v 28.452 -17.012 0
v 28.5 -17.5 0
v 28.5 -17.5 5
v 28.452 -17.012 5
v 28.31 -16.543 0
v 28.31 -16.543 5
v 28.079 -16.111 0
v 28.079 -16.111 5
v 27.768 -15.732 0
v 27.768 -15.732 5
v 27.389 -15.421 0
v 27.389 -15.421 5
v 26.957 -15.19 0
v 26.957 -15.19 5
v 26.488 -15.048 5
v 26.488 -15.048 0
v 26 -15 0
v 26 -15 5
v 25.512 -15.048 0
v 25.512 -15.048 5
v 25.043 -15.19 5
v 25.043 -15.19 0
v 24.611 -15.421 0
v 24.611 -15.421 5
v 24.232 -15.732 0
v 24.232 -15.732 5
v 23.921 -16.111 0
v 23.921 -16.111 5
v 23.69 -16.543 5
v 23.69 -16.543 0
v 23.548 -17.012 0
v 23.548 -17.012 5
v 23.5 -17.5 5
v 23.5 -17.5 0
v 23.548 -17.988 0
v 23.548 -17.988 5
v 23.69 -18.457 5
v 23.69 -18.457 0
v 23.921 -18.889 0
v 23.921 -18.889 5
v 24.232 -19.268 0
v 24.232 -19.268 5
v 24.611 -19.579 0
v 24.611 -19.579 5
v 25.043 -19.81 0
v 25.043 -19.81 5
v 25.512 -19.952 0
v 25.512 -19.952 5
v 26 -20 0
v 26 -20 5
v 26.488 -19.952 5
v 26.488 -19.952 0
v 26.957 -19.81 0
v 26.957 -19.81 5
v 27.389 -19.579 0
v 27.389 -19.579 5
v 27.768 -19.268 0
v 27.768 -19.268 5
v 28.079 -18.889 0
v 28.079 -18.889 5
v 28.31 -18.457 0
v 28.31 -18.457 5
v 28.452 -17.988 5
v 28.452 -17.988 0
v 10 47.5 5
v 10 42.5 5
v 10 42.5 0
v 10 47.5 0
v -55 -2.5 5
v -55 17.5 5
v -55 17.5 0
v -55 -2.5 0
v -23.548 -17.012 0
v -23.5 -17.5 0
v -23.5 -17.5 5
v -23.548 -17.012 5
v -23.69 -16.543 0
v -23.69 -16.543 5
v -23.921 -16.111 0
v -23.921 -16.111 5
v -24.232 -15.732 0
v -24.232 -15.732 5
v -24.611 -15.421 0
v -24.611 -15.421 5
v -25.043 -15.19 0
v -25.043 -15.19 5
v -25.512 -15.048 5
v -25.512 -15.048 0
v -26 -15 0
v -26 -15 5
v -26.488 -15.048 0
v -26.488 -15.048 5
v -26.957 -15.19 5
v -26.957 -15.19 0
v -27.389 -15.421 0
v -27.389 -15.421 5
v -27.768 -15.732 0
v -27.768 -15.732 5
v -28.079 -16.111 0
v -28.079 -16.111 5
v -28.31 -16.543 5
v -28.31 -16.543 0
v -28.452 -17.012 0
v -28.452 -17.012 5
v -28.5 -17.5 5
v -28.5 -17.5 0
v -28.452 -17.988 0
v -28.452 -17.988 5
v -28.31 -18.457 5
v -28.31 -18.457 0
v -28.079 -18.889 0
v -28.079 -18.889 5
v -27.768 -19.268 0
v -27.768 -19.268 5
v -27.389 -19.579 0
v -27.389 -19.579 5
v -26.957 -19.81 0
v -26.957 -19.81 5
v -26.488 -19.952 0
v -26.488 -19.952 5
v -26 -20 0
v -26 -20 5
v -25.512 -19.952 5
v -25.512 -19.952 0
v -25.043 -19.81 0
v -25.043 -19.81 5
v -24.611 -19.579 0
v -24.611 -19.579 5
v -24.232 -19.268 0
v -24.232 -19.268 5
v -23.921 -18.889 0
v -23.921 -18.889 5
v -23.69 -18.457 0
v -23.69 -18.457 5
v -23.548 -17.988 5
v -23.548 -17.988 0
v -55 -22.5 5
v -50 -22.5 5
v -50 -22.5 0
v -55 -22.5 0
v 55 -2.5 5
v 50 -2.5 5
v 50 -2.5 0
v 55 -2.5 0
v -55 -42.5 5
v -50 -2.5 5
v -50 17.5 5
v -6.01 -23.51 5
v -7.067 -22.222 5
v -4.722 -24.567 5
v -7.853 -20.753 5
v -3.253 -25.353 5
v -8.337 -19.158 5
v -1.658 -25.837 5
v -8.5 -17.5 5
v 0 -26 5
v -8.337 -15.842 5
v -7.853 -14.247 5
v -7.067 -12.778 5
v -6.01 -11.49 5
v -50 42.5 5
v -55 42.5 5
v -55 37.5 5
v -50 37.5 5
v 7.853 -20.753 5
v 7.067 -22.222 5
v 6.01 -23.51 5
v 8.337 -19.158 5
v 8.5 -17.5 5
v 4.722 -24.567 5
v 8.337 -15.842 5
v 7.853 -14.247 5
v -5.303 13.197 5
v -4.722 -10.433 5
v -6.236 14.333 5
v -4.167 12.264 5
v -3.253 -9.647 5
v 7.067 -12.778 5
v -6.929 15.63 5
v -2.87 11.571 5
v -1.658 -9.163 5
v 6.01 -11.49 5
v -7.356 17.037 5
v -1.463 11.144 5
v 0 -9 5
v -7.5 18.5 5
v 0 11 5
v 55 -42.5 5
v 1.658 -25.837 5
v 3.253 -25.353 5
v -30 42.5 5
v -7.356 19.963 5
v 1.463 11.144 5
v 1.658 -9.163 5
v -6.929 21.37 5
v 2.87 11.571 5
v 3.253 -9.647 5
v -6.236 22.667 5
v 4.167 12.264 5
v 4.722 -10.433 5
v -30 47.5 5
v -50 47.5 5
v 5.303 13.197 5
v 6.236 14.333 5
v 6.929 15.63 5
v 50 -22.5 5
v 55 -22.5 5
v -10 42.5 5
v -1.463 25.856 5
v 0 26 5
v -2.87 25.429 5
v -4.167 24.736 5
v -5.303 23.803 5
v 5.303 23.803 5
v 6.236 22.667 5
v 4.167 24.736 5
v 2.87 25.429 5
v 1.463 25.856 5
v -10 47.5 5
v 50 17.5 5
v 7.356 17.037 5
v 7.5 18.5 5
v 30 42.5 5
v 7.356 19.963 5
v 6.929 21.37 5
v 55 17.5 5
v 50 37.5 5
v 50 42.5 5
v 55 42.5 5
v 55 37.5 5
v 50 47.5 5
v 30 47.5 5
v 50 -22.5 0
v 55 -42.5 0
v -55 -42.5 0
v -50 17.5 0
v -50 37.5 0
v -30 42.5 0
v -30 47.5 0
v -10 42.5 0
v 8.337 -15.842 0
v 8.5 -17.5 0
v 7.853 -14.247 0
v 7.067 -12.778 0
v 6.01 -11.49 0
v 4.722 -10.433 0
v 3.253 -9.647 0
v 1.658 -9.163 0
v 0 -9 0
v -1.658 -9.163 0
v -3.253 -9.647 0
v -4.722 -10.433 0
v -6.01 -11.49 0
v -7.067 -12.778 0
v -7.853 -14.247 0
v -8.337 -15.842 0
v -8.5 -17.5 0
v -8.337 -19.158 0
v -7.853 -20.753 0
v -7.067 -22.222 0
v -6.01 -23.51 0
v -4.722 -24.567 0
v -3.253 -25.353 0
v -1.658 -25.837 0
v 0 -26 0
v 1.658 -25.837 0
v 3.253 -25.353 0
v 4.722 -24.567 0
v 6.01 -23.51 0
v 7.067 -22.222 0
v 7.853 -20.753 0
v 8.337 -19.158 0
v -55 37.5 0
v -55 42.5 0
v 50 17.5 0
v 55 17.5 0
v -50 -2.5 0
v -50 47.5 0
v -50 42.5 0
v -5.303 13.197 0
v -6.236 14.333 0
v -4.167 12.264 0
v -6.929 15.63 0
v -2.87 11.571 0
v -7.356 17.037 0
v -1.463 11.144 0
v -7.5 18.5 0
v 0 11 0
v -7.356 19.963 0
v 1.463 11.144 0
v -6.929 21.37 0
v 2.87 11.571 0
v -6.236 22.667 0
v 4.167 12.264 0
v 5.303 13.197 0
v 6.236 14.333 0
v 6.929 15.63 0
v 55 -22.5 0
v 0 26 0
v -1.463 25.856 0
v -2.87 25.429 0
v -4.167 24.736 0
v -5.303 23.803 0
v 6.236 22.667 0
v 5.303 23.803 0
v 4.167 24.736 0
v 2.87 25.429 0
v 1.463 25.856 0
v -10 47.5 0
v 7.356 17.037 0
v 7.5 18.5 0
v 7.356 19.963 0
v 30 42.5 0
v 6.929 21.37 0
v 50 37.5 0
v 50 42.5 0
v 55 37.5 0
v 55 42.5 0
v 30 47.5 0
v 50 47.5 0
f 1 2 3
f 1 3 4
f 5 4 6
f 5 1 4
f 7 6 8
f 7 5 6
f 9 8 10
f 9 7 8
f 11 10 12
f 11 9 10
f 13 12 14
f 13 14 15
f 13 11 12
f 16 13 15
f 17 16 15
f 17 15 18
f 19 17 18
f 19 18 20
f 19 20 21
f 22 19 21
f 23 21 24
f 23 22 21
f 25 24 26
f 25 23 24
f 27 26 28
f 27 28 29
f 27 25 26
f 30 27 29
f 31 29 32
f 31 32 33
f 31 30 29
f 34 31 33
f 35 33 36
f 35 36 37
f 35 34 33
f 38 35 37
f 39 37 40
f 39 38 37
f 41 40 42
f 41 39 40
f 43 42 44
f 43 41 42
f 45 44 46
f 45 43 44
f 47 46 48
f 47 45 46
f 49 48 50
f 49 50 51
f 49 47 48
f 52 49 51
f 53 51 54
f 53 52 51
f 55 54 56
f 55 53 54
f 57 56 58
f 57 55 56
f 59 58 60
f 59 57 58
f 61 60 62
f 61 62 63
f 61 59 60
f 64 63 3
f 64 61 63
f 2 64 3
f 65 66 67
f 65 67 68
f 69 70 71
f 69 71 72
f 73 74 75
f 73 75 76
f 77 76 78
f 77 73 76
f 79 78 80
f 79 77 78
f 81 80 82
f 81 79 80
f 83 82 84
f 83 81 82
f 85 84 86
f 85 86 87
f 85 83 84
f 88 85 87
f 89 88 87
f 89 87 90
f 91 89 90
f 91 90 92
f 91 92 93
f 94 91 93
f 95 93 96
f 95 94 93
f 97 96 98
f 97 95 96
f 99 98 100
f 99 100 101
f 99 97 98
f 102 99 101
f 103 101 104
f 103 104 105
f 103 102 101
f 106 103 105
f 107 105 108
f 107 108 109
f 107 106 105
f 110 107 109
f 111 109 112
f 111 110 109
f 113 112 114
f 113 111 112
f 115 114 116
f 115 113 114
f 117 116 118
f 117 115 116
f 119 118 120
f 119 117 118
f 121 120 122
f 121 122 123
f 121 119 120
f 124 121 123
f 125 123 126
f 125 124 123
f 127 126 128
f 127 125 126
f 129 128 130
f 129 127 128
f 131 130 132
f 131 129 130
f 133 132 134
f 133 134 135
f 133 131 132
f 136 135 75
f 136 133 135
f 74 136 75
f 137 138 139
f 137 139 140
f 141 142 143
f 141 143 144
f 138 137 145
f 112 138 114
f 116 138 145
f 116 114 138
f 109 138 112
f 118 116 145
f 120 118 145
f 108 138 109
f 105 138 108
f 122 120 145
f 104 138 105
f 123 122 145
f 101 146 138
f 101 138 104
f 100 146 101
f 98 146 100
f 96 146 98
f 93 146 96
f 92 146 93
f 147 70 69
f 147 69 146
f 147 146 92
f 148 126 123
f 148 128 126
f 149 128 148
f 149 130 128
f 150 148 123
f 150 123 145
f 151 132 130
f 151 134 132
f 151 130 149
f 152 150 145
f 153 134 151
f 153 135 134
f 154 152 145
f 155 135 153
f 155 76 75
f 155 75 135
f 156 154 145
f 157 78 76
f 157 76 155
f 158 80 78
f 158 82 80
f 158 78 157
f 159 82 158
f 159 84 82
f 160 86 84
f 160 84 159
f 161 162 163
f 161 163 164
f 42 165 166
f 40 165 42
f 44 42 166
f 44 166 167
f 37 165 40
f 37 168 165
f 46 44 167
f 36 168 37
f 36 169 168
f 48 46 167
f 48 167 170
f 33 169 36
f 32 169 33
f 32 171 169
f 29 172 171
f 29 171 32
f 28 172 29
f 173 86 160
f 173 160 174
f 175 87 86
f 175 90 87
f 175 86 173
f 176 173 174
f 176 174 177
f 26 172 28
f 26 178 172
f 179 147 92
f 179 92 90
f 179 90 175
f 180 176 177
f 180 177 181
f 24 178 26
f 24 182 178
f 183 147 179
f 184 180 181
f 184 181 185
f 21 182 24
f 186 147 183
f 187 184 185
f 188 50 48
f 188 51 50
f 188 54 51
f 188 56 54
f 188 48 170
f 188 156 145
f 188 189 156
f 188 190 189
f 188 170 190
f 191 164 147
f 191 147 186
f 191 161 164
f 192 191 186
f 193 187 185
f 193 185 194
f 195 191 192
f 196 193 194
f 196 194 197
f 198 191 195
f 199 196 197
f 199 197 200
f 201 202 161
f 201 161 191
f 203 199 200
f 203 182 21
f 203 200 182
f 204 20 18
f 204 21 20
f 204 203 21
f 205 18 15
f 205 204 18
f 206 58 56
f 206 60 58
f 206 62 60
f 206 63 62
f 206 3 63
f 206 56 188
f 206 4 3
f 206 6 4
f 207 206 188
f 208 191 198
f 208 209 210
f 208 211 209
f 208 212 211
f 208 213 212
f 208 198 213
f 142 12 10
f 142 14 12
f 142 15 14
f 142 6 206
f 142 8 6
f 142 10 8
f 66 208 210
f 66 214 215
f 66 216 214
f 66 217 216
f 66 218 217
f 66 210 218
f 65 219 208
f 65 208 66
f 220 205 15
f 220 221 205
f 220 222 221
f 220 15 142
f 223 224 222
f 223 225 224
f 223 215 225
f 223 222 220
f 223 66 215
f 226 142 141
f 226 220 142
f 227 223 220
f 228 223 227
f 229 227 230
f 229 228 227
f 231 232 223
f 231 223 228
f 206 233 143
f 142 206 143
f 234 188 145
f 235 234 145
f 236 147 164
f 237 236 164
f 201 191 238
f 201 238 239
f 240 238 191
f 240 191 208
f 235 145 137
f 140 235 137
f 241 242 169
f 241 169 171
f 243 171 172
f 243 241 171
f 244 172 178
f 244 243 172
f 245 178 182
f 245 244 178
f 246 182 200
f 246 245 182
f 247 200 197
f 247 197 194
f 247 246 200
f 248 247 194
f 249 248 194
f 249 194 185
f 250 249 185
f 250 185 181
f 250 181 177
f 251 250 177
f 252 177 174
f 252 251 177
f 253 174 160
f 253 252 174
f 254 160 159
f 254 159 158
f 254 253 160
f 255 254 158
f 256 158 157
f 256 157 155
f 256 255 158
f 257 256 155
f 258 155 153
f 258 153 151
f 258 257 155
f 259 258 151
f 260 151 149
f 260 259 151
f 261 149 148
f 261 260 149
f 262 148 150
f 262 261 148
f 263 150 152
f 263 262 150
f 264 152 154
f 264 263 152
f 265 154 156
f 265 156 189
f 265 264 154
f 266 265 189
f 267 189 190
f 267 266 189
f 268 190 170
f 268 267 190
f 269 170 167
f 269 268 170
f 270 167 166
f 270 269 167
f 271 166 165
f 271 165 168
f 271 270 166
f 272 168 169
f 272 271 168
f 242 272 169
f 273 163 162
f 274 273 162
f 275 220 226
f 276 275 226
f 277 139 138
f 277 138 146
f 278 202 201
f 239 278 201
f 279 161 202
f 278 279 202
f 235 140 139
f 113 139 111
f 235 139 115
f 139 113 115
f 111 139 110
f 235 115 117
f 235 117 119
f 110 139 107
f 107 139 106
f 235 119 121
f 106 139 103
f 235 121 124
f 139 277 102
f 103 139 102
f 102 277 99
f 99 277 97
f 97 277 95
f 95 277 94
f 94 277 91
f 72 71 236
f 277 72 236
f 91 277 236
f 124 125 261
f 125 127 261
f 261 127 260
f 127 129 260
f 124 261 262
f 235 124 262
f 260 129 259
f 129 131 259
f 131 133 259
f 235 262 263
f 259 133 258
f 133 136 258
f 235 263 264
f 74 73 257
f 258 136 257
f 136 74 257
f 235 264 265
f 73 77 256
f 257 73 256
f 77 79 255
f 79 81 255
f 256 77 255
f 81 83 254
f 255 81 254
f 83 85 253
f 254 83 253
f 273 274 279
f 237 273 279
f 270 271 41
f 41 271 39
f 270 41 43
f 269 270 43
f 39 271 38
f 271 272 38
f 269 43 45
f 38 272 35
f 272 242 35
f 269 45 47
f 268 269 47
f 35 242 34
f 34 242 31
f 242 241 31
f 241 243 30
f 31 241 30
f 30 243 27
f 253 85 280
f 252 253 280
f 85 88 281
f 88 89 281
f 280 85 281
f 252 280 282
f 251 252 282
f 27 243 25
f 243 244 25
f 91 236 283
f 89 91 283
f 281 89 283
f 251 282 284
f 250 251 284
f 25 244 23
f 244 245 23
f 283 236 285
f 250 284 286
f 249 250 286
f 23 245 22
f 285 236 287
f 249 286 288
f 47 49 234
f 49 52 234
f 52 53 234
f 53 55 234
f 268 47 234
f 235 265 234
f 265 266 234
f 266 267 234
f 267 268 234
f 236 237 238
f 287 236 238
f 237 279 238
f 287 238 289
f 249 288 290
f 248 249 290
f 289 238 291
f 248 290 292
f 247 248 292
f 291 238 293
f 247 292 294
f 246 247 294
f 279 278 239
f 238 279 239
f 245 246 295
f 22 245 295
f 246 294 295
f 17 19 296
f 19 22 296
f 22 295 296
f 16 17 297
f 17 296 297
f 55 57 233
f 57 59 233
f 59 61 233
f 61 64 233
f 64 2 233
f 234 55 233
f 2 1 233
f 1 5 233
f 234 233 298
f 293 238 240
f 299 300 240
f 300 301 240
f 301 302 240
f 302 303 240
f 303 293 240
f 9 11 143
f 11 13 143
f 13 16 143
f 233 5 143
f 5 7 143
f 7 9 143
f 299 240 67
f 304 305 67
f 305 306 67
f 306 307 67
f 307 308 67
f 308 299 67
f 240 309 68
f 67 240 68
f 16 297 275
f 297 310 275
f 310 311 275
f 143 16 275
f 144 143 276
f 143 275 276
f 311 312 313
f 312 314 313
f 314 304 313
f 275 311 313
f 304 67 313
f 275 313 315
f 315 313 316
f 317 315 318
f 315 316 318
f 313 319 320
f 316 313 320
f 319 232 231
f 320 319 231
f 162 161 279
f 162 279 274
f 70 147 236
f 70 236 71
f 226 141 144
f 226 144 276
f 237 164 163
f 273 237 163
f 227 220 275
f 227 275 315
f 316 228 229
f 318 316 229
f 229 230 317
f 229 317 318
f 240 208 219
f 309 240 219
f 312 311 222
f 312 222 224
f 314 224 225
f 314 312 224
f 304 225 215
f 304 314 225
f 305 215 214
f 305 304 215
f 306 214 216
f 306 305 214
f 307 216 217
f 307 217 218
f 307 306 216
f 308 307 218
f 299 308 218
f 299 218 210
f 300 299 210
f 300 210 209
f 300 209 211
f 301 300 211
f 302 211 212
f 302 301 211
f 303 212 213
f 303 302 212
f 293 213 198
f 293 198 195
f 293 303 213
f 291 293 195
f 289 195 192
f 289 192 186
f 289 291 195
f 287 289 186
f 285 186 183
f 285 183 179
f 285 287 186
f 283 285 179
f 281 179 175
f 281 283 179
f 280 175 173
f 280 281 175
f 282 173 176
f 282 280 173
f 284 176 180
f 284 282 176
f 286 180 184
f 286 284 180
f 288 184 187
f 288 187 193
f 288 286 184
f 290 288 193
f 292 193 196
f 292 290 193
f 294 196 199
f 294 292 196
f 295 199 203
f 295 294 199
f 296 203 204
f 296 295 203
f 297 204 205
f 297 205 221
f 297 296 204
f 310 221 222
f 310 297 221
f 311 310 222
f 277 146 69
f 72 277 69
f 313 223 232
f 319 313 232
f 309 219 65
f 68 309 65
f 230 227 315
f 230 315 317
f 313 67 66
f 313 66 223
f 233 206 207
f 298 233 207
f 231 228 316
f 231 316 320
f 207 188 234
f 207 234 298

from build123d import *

# Parameters (mm, degrees)
SKETCH_1_W                       = 100
SKETCH_1_H                       = 85
SKETCH_1_R                       = 8.5
SKETCH_1_R_2                     = 2.5
SKETCH_1_R_3                     = 7.5
EXTRUDE_1_DEPTH                  = 5
SKETCH_2_W                       = 5
SKETCH_2_H                       = 20
EXTRUDE_2_DEPTH                  = 5
PATTERN_LINEAR_1_COUNT           = 2
PATTERN_LINEAR_1_PITCH           = 40
PATTERN_LINEAR_1_COPY_1_SKETCH_W = 5
PATTERN_LINEAR_1_COPY_1_SKETCH_H = 20
PATTERN_LINEAR_1_COPY_1_DEPTH    = 5
SKETCH_3_W                       = 20
SKETCH_3_H                       = 5
EXTRUDE_3_DEPTH                  = 5
PATTERN_LINEAR_2_COUNT           = 2
PATTERN_LINEAR_2_PITCH           = 40
PATTERN_LINEAR_3_COUNT           = 2
PATTERN_LINEAR_3_PITCH           = 40
SKETCH_5_W                       = 5
SKETCH_5_H                       = 5
EXTRUDE_4_DEPTH                  = 5


with BuildPart() as part:
    # 스케치1 → 보스-돌출1 (new body)
    with BuildSketch(Plane.XY):
        Rectangle(SKETCH_1_W, SKETCH_1_H)
        with Locations((0, -17.5)):
            Circle(SKETCH_1_R, mode=Mode.SUBTRACT)
        with Locations((-26, -17.5)):
            Circle(SKETCH_1_R_2, mode=Mode.SUBTRACT)
        with Locations((26, -17.5)):
            Circle(SKETCH_1_R_2, mode=Mode.SUBTRACT)
        with Locations((0, 18.5)):
            Circle(SKETCH_1_R_3, mode=Mode.SUBTRACT)
    extrude(amount=EXTRUDE_1_DEPTH)

    # 스케치2 → 보스-돌출2 (add)
    with BuildSketch(Plane.XY.offset(5)):
        with Locations((52.5, -32.5)):
            Rectangle(SKETCH_2_W, SKETCH_2_H)
    extrude_2 = extrude(amount=-EXTRUDE_2_DEPTH)

    # 대칭 복사1: 보스-돌출2 across plane
    add(extrude_2.mirror(Plane(origin=(0, 0, 0), x_dir=(0, 0, 1), z_dir=(1, 0, 0))))

    # 선형 패턴1: 보스-돌출2 ×2
    with Locations(*[(0, i * PATTERN_LINEAR_1_PITCH, 0) for i in range(1, PATTERN_LINEAR_1_COUNT)]):
        add(extrude_2)

    # 선형 패턴1 copy 1 sketch → 선형 패턴1 copy 1 (add)
    with BuildSketch(Plane(origin=(0, 40, 5), x_dir=(-1, 0, 0), z_dir=(0, 0, 1))):
        with Locations((52.5, 32.5)):
            Rectangle(PATTERN_LINEAR_1_COPY_1_SKETCH_W, PATTERN_LINEAR_1_COPY_1_SKETCH_H)
    extrude(amount=-PATTERN_LINEAR_1_COPY_1_DEPTH)

    # 스케치3 → 보스-돌출3 (add)
    with BuildSketch(Plane.XY.offset(5)):
        with Locations((0, 45)):
            Rectangle(SKETCH_3_W, SKETCH_3_H)
    extrude_3 = extrude(amount=-EXTRUDE_3_DEPTH)

    # 선형 패턴2: 보스-돌출3 ×2
    with Locations(*[(i * PATTERN_LINEAR_2_PITCH, 0, 0) for i in range(1, PATTERN_LINEAR_2_COUNT)]):
        add(extrude_3)

    # 선형 패턴3: 보스-돌출3 ×2
    with Locations(*[(-i * PATTERN_LINEAR_3_PITCH, 0, 0) for i in range(1, PATTERN_LINEAR_3_COUNT)]):
        add(extrude_3)

    # 스케치5 → 보스-돌출4 (add)
    with BuildSketch(Plane.XY.offset(5)):
        with Locations((52.5, 40)):
            Rectangle(SKETCH_5_W, SKETCH_5_H)
    extrude_4 = extrude(amount=-EXTRUDE_4_DEPTH)

    # 대칭 복사2: 보스-돌출4 across plane
    add(extrude_4.mirror(Plane(origin=(0, 0, 0), x_dir=(0, 0, 1), z_dir=(1, 0, 0))))


solid = part.part
